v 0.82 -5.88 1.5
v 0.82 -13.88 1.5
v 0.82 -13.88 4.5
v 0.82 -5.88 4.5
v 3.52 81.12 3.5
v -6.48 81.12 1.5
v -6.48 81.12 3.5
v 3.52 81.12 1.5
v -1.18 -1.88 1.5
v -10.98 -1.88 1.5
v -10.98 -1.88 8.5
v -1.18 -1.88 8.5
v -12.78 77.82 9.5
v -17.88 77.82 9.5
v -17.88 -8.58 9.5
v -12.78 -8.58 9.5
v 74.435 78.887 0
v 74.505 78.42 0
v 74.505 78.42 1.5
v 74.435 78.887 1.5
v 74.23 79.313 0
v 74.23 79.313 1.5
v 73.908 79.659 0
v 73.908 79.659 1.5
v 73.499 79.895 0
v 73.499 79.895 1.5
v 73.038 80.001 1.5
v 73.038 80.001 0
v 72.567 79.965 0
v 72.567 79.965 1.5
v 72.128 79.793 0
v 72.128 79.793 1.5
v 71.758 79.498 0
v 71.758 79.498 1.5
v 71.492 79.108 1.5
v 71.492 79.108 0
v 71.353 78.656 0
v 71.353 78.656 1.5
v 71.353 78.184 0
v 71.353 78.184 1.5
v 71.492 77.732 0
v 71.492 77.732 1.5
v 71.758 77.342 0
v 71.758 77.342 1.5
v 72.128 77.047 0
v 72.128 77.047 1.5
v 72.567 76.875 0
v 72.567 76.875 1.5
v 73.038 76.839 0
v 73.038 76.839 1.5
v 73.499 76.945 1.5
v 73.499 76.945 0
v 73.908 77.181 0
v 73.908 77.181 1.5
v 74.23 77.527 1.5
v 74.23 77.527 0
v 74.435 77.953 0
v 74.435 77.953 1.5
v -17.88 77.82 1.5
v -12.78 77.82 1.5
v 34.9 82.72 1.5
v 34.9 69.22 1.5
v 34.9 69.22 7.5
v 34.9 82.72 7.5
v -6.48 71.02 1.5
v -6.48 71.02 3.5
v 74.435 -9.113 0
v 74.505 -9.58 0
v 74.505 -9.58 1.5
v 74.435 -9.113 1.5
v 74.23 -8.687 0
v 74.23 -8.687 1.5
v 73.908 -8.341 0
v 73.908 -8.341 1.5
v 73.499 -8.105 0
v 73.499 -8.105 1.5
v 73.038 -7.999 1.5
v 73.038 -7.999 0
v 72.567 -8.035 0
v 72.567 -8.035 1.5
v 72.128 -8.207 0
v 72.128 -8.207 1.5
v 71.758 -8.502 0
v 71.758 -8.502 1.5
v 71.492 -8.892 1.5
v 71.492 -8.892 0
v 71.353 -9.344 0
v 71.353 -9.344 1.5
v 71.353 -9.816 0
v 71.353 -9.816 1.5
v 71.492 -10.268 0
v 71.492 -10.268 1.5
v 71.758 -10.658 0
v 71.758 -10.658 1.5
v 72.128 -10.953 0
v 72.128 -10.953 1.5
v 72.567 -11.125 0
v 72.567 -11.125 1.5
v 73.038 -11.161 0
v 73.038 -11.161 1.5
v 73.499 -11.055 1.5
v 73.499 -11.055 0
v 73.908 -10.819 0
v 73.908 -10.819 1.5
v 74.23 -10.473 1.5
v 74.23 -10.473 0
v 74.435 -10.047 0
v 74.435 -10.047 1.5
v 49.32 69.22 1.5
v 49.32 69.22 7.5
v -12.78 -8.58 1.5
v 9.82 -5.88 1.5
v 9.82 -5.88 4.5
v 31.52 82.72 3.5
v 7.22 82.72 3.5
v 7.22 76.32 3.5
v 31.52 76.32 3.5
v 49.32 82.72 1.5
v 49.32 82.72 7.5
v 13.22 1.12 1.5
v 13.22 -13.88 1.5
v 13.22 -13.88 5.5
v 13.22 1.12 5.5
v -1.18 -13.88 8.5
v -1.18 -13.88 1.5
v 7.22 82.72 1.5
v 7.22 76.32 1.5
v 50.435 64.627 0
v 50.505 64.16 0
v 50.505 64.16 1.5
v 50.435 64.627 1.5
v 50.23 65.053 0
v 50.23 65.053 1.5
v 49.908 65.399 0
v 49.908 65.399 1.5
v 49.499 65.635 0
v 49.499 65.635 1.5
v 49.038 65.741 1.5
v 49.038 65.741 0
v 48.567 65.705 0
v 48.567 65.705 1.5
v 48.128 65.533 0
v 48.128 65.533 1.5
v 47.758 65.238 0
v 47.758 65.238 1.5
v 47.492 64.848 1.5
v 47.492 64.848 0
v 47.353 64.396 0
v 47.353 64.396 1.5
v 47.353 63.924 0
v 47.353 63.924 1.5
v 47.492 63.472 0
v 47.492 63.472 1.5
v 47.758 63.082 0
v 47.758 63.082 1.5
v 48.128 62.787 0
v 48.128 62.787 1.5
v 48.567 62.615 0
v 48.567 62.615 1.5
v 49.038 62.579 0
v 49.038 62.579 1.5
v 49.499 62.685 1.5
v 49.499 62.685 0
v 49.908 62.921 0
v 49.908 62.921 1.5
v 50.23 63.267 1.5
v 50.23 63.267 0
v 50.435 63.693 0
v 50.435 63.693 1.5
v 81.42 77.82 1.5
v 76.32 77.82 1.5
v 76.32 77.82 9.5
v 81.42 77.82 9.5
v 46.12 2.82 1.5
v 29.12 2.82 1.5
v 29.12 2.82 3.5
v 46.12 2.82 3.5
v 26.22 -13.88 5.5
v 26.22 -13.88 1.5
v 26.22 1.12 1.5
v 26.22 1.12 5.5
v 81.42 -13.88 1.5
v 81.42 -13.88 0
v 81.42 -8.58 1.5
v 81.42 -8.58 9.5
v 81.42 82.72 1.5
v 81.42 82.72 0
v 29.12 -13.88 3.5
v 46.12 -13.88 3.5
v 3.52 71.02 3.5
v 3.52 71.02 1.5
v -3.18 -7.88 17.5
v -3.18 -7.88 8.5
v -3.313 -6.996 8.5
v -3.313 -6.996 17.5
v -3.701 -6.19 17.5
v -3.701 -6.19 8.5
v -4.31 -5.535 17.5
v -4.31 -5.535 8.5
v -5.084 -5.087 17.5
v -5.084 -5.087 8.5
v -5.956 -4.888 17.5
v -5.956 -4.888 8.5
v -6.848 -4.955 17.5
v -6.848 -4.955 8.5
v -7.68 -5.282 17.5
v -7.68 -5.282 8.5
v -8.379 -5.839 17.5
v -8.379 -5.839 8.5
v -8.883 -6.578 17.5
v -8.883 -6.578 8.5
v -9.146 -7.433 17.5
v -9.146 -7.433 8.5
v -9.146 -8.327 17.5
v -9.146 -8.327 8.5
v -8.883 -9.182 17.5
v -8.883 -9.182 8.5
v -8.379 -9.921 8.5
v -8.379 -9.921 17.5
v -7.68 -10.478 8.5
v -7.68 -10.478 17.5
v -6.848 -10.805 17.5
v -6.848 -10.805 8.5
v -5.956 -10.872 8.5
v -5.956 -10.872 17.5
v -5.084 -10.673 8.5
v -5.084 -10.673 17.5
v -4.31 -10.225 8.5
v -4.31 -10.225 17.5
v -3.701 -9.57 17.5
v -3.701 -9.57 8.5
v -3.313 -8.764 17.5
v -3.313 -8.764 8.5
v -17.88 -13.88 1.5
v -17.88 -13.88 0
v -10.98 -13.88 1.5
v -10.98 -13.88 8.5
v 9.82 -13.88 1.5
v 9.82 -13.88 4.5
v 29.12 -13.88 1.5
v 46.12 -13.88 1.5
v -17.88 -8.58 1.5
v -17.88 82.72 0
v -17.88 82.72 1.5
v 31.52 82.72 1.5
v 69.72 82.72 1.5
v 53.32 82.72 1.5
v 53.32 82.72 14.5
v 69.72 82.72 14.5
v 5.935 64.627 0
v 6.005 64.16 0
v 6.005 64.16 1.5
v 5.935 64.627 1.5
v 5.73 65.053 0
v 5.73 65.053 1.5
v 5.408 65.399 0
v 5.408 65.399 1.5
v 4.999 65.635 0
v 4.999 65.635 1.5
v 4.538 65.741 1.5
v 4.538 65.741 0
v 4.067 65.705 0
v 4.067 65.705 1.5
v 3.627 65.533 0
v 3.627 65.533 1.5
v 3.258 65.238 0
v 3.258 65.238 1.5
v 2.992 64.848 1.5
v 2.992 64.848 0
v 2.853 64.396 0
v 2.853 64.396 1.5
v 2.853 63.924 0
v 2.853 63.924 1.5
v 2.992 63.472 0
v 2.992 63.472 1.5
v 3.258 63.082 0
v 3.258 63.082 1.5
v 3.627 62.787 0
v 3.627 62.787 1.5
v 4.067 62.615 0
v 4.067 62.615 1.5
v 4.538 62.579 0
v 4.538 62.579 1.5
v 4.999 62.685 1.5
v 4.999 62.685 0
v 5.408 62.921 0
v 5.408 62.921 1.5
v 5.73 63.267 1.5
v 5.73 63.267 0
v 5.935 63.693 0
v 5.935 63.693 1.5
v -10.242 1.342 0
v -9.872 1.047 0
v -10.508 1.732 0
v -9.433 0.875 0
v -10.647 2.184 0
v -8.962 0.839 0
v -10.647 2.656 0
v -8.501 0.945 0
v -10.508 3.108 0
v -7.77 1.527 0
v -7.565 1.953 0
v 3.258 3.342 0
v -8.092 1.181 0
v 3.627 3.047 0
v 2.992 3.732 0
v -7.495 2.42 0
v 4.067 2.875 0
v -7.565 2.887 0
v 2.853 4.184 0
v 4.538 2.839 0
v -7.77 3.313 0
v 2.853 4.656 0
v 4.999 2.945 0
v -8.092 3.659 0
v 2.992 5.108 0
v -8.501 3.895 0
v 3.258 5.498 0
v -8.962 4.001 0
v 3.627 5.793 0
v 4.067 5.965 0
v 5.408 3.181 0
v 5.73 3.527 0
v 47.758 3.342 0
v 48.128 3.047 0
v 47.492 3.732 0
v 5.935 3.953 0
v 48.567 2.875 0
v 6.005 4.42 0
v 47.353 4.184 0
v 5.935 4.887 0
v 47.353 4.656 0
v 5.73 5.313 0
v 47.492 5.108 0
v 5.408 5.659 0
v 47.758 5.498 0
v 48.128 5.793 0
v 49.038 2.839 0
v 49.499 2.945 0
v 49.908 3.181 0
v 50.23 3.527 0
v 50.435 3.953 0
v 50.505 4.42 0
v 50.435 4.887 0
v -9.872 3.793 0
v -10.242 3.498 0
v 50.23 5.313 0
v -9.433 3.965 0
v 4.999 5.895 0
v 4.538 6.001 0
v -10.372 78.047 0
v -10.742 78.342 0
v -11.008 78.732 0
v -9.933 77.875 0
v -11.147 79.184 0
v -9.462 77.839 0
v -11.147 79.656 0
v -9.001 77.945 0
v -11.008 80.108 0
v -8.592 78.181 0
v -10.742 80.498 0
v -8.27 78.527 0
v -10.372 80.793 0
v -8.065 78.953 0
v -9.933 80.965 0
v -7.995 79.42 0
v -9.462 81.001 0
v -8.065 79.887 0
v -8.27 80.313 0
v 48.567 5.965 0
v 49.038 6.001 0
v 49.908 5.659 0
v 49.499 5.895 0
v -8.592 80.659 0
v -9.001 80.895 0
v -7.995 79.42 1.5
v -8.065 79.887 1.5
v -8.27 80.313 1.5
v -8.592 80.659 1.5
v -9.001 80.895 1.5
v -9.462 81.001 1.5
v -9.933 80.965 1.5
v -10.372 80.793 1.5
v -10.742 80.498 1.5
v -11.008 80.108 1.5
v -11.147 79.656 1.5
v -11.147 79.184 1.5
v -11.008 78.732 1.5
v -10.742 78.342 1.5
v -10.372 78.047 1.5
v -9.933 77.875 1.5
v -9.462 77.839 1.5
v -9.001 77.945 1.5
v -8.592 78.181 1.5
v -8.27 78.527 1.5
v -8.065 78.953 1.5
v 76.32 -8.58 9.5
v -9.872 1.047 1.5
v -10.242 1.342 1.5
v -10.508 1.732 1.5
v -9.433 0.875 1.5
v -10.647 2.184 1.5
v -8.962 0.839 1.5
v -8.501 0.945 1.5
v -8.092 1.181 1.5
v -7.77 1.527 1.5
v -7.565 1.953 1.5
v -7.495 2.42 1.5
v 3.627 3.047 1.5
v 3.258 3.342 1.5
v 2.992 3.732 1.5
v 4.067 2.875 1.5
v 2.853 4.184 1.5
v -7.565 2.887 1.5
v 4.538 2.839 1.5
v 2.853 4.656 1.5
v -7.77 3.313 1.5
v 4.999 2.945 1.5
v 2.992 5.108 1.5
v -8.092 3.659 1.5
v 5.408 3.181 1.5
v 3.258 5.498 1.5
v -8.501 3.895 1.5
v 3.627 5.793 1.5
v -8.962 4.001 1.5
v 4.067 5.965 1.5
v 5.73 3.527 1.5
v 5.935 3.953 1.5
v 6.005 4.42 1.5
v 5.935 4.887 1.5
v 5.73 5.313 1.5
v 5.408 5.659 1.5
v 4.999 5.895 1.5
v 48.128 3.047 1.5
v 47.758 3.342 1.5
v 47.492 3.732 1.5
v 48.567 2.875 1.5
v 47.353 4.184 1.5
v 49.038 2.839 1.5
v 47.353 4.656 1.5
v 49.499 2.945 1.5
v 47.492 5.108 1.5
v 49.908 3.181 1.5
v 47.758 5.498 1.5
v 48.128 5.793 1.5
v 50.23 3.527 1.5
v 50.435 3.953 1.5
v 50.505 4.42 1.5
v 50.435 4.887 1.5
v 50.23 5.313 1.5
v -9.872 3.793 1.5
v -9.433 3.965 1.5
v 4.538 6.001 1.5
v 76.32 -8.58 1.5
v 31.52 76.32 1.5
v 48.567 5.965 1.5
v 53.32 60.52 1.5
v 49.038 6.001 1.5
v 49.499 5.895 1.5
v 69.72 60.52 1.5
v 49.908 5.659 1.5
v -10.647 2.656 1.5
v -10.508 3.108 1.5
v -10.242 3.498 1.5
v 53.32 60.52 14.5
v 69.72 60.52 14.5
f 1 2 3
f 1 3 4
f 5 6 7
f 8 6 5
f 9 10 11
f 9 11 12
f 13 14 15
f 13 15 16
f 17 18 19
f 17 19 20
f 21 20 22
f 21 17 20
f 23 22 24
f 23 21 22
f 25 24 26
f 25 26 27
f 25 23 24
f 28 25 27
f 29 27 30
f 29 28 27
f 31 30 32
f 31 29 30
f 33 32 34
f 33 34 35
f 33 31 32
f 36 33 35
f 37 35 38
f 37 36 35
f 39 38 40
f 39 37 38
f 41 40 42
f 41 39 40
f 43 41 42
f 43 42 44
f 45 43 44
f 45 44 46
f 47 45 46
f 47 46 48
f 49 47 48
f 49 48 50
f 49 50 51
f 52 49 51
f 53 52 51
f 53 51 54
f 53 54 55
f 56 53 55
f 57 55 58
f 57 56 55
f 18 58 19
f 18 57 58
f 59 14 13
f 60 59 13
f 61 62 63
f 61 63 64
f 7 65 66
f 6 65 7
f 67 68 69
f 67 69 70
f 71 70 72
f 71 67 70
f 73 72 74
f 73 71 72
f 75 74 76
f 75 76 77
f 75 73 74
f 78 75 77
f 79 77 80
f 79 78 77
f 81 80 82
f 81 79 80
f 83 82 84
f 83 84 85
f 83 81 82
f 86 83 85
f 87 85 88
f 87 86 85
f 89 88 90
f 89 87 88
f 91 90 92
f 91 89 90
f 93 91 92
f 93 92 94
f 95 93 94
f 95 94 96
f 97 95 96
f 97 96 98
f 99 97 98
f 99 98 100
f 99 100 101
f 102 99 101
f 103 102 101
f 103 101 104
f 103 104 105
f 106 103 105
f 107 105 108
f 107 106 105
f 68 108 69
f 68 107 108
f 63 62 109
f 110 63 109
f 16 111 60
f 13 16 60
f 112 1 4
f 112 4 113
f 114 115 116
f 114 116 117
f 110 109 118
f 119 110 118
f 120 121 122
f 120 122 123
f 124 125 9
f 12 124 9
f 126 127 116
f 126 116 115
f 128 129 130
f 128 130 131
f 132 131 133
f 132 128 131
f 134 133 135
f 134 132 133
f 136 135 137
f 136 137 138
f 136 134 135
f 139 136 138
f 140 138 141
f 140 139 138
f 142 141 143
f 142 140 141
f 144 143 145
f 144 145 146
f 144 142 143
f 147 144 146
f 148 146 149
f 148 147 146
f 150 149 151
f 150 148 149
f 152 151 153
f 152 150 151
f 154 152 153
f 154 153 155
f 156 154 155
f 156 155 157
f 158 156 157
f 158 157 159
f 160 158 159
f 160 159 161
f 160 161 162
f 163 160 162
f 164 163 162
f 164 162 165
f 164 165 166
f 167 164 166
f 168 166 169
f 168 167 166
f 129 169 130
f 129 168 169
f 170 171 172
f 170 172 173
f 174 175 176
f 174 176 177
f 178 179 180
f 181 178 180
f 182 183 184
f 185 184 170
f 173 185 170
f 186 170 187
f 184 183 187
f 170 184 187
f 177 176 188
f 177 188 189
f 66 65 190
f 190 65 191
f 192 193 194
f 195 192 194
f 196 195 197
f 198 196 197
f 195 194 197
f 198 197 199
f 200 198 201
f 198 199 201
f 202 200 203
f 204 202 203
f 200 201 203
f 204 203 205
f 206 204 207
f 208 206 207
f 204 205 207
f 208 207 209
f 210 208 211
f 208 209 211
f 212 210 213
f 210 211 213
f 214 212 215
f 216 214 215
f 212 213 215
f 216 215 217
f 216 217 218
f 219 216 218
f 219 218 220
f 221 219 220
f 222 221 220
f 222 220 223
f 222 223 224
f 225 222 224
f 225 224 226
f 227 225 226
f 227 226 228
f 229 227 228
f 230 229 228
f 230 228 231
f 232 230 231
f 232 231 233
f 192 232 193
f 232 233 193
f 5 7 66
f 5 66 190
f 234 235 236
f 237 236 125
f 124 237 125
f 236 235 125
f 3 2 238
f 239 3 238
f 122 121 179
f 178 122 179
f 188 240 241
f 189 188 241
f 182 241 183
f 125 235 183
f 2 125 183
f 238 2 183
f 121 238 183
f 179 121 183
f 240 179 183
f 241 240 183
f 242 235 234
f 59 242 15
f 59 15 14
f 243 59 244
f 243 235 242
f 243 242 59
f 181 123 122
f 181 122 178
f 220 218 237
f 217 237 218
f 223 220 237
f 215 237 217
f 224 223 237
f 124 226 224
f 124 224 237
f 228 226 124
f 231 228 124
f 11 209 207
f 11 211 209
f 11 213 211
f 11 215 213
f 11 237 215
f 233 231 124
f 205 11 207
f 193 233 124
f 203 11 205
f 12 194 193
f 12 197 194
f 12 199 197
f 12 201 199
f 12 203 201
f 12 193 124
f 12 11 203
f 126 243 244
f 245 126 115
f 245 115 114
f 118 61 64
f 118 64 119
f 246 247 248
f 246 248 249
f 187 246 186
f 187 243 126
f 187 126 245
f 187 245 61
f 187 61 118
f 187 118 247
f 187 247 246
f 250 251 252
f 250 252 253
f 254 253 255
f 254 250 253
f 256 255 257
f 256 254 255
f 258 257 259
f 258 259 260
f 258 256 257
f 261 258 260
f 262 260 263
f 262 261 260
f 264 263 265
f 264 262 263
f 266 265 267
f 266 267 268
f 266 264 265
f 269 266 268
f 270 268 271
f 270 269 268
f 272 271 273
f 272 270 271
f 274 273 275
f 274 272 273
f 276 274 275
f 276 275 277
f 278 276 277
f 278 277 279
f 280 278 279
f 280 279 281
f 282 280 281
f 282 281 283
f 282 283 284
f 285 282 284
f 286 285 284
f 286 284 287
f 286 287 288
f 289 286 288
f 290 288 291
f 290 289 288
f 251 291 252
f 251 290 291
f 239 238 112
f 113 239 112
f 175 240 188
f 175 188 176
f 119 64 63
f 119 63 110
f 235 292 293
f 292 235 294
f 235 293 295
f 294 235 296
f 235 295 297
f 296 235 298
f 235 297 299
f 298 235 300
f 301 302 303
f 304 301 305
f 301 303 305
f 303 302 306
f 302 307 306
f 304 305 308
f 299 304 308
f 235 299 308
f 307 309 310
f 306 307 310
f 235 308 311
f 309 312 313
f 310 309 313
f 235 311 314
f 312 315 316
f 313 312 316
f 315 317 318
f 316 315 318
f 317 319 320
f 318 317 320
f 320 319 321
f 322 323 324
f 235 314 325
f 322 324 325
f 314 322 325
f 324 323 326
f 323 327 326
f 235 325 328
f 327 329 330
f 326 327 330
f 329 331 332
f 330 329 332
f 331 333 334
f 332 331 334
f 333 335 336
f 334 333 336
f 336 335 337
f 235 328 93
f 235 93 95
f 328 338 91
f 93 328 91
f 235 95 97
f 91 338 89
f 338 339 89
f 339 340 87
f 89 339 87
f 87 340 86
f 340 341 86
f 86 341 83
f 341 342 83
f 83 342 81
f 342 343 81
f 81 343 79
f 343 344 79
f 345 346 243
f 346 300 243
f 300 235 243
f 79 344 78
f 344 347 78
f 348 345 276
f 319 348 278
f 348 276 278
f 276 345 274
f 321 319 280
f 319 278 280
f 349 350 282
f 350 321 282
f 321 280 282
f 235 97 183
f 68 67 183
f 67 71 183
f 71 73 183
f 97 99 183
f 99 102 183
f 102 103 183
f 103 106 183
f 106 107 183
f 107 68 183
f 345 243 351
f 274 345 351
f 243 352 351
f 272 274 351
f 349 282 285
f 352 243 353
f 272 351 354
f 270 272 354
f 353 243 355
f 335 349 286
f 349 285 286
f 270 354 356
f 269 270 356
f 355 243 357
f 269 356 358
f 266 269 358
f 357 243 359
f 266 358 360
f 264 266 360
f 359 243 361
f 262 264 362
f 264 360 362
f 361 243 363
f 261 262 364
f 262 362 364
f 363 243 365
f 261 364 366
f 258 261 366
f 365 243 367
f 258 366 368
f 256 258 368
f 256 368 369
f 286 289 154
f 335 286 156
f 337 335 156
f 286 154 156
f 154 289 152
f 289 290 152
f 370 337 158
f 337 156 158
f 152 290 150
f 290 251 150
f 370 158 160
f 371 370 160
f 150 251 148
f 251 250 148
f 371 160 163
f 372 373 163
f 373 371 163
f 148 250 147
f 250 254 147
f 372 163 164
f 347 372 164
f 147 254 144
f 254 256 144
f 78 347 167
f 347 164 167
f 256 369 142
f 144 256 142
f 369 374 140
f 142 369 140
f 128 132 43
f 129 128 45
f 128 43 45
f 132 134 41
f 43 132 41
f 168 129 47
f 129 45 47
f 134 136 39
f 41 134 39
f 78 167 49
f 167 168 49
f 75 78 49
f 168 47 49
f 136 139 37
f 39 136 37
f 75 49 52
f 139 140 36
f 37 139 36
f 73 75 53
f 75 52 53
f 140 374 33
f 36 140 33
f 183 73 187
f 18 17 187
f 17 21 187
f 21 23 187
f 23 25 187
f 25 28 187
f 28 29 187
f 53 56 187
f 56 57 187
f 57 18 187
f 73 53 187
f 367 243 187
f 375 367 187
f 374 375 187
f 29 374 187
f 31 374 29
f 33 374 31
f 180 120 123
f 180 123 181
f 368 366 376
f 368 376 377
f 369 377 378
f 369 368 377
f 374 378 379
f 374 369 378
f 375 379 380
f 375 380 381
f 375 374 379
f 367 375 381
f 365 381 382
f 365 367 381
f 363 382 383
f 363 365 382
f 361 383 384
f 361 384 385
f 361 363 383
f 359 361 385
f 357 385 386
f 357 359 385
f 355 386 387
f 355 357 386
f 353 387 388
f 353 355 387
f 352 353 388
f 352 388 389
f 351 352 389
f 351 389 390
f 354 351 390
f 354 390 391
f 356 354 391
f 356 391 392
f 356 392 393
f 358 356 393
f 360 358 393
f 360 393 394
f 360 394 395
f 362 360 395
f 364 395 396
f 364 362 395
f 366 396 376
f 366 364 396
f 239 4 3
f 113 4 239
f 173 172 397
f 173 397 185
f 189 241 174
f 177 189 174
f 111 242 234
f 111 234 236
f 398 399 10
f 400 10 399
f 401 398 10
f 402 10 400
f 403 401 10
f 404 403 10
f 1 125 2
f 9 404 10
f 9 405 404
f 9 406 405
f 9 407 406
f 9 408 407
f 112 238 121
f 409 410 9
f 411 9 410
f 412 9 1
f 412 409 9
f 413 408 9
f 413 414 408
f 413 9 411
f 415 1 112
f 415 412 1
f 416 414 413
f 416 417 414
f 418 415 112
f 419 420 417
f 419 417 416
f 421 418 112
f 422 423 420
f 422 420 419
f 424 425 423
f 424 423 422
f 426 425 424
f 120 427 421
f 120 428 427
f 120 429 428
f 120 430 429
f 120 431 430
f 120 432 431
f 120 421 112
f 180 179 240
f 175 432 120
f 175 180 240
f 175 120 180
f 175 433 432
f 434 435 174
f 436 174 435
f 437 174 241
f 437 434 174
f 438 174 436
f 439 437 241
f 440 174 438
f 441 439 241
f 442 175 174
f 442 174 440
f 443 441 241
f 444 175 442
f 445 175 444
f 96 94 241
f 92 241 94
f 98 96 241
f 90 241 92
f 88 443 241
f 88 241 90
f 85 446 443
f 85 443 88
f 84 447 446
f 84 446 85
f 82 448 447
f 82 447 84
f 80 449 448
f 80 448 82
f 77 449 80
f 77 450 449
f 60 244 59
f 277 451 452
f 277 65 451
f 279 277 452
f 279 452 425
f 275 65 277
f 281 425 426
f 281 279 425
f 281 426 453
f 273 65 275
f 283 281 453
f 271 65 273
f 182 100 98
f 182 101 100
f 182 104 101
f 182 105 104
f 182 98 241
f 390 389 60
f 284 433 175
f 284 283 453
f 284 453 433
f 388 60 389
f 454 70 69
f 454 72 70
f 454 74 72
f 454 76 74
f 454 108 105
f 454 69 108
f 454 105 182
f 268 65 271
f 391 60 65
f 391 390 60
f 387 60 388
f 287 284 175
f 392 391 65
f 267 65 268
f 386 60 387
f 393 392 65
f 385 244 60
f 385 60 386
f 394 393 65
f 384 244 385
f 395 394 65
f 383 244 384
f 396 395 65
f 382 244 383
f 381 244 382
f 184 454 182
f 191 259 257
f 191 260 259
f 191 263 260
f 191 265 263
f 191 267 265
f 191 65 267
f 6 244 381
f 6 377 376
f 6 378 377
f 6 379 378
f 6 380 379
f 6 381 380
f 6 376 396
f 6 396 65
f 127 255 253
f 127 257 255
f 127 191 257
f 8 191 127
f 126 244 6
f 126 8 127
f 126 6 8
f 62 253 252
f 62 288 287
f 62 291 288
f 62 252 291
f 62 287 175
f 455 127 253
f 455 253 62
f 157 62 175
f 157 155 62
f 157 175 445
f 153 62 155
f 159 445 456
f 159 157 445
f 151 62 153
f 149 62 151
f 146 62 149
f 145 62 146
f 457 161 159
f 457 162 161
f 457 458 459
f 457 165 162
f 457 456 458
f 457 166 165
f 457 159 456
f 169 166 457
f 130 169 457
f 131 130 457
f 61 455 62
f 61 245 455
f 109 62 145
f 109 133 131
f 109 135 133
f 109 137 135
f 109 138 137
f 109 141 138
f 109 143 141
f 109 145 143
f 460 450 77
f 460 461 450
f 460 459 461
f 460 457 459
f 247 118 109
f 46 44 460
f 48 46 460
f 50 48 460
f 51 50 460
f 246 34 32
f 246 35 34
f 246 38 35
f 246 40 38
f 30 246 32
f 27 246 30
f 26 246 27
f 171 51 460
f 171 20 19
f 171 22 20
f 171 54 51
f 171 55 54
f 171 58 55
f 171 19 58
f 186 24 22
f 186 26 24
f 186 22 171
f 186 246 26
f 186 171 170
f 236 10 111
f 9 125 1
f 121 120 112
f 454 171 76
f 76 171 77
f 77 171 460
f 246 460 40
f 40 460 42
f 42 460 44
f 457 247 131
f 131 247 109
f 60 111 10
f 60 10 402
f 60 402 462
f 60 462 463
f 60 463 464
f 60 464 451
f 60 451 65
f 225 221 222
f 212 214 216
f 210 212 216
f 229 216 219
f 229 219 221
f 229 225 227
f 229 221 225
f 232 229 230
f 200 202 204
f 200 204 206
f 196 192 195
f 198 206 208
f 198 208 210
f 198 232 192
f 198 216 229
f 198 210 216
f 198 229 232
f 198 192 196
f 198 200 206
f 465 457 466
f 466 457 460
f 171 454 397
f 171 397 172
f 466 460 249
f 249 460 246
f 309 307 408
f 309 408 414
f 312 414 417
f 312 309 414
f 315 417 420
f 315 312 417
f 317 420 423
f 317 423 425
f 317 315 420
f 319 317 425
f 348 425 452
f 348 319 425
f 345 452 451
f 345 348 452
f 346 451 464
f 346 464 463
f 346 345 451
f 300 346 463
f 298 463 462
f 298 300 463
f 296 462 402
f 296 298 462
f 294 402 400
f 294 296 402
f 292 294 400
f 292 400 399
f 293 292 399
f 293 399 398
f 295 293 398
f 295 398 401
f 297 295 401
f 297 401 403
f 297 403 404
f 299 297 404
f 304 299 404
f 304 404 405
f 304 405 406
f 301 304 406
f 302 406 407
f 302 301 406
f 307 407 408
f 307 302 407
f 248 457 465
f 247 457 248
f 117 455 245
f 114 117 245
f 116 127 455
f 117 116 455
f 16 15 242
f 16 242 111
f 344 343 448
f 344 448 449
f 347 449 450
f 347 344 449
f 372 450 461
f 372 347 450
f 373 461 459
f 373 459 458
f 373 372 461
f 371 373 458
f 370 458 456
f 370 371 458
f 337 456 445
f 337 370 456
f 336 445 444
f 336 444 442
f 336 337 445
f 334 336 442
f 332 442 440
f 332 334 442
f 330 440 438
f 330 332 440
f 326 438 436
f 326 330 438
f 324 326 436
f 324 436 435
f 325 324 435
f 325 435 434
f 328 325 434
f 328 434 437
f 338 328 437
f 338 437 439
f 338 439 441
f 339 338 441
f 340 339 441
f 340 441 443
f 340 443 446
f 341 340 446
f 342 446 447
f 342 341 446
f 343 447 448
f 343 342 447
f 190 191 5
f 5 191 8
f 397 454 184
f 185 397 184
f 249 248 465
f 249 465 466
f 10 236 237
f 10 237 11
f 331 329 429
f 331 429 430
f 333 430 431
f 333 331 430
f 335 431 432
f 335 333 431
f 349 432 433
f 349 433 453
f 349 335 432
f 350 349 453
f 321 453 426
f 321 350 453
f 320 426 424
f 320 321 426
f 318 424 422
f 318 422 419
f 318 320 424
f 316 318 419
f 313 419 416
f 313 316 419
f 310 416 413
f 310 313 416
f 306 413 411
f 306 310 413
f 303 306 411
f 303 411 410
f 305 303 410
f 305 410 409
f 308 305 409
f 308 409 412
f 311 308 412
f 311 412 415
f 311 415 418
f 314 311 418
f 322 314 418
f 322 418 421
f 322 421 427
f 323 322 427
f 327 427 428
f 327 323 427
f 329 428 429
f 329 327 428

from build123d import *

# Parameters (mm, degrees)
SKETCH_1_W       = 99.3
SKETCH_1_H       = 96.6
SKETCH_1_R       = 1.585
EXTRUDE_1_DEPTH  = 1.5
SKETCH_2_W       = 9.8
SKETCH_2_H       = 12
EXTRUDE_2_DEPTH  = 7
SKETCH_3_R       = 3
EXTRUDE_3_DEPTH  = 9
SKETCH_4_W       = 5.1
SKETCH_4_H       = 86.4
EXTRUDE_4_DEPTH  = 8
SKETCH_5_W       = 16.4
SKETCH_5_H       = 22.2
EXTRUDE_5_DEPTH  = 13
SKETCH_6_W       = 14.42
SKETCH_6_H       = 13.5
EXTRUDE_6_DEPTH  = 6
SKETCH_7_W       = 24.3
SKETCH_7_H       = 6.4
EXTRUDE_7_DEPTH  = 2
SKETCH_8_W       = 10
SKETCH_8_H       = 10.1
EXTRUDE_8_DEPTH  = 2
SKETCH_9_W       = 9
SKETCH_9_H       = 8
EXTRUDE_9_DEPTH  = 3
SKETCH_10_W      = 13
SKETCH_10_H      = 15
EXTRUDE_10_DEPTH = 4
SKETCH_11_W      = 17
SKETCH_11_H      = 16.7
EXTRUDE_11_DEPTH = 2


with BuildPart() as part:
    # 草图1 → 凸台-拉伸1 (new body)
    with BuildSketch(Plane.XY):
        with Locations((31.77, 34.42)):
            Rectangle(SKETCH_1_W, SKETCH_1_H)
        with Locations((48.92, 64.16)):
            Circle(SKETCH_1_R, mode=Mode.SUBTRACT)
        with Locations((4.42, 64.16)):
            Circle(SKETCH_1_R, mode=Mode.SUBTRACT)
        with Locations((4.42, 4.42)):
            Circle(SKETCH_1_R, mode=Mode.SUBTRACT)
        with Locations((48.92, 4.42)):
            Circle(SKETCH_1_R, mode=Mode.SUBTRACT)
        with Locations((-9.08, 2.42)):
            Circle(SKETCH_1_R, mode=Mode.SUBTRACT)
        with Locations((72.92, -9.58)):
            Circle(SKETCH_1_R, mode=Mode.SUBTRACT)
        with Locations((72.92, 78.42)):
            Circle(SKETCH_1_R, mode=Mode.SUBTRACT)
        with Locations((-9.58, 79.42)):
            Circle(SKETCH_1_R, mode=Mode.SUBTRACT)
    extrude(amount=EXTRUDE_1_DEPTH)

    # 草图2 → 凸台-拉伸2 (add)
    with BuildSketch(Plane.XY.offset(1.5)):
        with Locations((-6.08, -7.88)):
            Rectangle(SKETCH_2_W, SKETCH_2_H)
    extrude(amount=EXTRUDE_2_DEPTH)

    # 草图3 → 凸台-拉伸3 (add)
    with BuildSketch(Plane.XY.offset(8.5)):
        with Locations((-6.18, -7.88)):
            Circle(SKETCH_3_R)
    extrude(amount=EXTRUDE_3_DEPTH)

    # 草图4 → 凸台-拉伸4 (add)
    with BuildSketch(Plane.XY.offset(1.5)):
        with Locations((78.87, 34.62)):
            Rectangle(SKETCH_4_W, SKETCH_4_H)
        with Locations((-15.33, 34.62)):
            Rectangle(SKETCH_4_W, SKETCH_4_H)
    extrude(amount=EXTRUDE_4_DEPTH)

    # 草图5 → 凸台-拉伸5 (add)
    with BuildSketch(Plane.XY.offset(1.5)):
        with Locations((61.52, 71.62)):
            Rectangle(SKETCH_5_W, SKETCH_5_H)
    extrude(amount=EXTRUDE_5_DEPTH)

    # 草图6 → 凸台-拉伸6 (add)
    with BuildSketch(Plane.XY.offset(1.5)):
        with Locations((42.11, 75.97)):
            Rectangle(SKETCH_6_W, SKETCH_6_H)
    extrude(amount=EXTRUDE_6_DEPTH)

    # 草图7 → 凸台-拉伸7 (add)
    with BuildSketch(Plane.XY.offset(1.5)):
        with Locations((19.37, 79.52)):
            Rectangle(SKETCH_7_W, SKETCH_7_H)
    extrude(amount=EXTRUDE_7_DEPTH)

    # 草图8 → 凸台-拉伸8 (add)
    with BuildSketch(Plane.XY.offset(1.5)):
        with Locations((-1.48, 76.07)):
            Rectangle(SKETCH_8_W, SKETCH_8_H)
    extrude(amount=EXTRUDE_8_DEPTH)

    # 草图9 → 凸台-拉伸9 (add)
    with BuildSketch(Plane.XY.offset(1.5)):
        with Locations((5.32, -9.88)):
            Rectangle(SKETCH_9_W, SKETCH_9_H)
    extrude(amount=EXTRUDE_9_DEPTH)

    # 草图10 → 凸台-拉伸10 (add)
    with BuildSketch(Plane.XY.offset(1.5)):
        with Locations((19.72, -6.38)):
            Rectangle(SKETCH_10_W, SKETCH_10_H)
    extrude(amount=EXTRUDE_10_DEPTH)

    # 草图11 → 凸台-拉伸11 (add)
    with BuildSketch(Plane.XY.offset(1.5)):
        with Locations((37.62, -5.53)):
            Rectangle(SKETCH_11_W, SKETCH_11_H)
    extrude(amount=EXTRUDE_11_DEPTH)


solid = part.part
